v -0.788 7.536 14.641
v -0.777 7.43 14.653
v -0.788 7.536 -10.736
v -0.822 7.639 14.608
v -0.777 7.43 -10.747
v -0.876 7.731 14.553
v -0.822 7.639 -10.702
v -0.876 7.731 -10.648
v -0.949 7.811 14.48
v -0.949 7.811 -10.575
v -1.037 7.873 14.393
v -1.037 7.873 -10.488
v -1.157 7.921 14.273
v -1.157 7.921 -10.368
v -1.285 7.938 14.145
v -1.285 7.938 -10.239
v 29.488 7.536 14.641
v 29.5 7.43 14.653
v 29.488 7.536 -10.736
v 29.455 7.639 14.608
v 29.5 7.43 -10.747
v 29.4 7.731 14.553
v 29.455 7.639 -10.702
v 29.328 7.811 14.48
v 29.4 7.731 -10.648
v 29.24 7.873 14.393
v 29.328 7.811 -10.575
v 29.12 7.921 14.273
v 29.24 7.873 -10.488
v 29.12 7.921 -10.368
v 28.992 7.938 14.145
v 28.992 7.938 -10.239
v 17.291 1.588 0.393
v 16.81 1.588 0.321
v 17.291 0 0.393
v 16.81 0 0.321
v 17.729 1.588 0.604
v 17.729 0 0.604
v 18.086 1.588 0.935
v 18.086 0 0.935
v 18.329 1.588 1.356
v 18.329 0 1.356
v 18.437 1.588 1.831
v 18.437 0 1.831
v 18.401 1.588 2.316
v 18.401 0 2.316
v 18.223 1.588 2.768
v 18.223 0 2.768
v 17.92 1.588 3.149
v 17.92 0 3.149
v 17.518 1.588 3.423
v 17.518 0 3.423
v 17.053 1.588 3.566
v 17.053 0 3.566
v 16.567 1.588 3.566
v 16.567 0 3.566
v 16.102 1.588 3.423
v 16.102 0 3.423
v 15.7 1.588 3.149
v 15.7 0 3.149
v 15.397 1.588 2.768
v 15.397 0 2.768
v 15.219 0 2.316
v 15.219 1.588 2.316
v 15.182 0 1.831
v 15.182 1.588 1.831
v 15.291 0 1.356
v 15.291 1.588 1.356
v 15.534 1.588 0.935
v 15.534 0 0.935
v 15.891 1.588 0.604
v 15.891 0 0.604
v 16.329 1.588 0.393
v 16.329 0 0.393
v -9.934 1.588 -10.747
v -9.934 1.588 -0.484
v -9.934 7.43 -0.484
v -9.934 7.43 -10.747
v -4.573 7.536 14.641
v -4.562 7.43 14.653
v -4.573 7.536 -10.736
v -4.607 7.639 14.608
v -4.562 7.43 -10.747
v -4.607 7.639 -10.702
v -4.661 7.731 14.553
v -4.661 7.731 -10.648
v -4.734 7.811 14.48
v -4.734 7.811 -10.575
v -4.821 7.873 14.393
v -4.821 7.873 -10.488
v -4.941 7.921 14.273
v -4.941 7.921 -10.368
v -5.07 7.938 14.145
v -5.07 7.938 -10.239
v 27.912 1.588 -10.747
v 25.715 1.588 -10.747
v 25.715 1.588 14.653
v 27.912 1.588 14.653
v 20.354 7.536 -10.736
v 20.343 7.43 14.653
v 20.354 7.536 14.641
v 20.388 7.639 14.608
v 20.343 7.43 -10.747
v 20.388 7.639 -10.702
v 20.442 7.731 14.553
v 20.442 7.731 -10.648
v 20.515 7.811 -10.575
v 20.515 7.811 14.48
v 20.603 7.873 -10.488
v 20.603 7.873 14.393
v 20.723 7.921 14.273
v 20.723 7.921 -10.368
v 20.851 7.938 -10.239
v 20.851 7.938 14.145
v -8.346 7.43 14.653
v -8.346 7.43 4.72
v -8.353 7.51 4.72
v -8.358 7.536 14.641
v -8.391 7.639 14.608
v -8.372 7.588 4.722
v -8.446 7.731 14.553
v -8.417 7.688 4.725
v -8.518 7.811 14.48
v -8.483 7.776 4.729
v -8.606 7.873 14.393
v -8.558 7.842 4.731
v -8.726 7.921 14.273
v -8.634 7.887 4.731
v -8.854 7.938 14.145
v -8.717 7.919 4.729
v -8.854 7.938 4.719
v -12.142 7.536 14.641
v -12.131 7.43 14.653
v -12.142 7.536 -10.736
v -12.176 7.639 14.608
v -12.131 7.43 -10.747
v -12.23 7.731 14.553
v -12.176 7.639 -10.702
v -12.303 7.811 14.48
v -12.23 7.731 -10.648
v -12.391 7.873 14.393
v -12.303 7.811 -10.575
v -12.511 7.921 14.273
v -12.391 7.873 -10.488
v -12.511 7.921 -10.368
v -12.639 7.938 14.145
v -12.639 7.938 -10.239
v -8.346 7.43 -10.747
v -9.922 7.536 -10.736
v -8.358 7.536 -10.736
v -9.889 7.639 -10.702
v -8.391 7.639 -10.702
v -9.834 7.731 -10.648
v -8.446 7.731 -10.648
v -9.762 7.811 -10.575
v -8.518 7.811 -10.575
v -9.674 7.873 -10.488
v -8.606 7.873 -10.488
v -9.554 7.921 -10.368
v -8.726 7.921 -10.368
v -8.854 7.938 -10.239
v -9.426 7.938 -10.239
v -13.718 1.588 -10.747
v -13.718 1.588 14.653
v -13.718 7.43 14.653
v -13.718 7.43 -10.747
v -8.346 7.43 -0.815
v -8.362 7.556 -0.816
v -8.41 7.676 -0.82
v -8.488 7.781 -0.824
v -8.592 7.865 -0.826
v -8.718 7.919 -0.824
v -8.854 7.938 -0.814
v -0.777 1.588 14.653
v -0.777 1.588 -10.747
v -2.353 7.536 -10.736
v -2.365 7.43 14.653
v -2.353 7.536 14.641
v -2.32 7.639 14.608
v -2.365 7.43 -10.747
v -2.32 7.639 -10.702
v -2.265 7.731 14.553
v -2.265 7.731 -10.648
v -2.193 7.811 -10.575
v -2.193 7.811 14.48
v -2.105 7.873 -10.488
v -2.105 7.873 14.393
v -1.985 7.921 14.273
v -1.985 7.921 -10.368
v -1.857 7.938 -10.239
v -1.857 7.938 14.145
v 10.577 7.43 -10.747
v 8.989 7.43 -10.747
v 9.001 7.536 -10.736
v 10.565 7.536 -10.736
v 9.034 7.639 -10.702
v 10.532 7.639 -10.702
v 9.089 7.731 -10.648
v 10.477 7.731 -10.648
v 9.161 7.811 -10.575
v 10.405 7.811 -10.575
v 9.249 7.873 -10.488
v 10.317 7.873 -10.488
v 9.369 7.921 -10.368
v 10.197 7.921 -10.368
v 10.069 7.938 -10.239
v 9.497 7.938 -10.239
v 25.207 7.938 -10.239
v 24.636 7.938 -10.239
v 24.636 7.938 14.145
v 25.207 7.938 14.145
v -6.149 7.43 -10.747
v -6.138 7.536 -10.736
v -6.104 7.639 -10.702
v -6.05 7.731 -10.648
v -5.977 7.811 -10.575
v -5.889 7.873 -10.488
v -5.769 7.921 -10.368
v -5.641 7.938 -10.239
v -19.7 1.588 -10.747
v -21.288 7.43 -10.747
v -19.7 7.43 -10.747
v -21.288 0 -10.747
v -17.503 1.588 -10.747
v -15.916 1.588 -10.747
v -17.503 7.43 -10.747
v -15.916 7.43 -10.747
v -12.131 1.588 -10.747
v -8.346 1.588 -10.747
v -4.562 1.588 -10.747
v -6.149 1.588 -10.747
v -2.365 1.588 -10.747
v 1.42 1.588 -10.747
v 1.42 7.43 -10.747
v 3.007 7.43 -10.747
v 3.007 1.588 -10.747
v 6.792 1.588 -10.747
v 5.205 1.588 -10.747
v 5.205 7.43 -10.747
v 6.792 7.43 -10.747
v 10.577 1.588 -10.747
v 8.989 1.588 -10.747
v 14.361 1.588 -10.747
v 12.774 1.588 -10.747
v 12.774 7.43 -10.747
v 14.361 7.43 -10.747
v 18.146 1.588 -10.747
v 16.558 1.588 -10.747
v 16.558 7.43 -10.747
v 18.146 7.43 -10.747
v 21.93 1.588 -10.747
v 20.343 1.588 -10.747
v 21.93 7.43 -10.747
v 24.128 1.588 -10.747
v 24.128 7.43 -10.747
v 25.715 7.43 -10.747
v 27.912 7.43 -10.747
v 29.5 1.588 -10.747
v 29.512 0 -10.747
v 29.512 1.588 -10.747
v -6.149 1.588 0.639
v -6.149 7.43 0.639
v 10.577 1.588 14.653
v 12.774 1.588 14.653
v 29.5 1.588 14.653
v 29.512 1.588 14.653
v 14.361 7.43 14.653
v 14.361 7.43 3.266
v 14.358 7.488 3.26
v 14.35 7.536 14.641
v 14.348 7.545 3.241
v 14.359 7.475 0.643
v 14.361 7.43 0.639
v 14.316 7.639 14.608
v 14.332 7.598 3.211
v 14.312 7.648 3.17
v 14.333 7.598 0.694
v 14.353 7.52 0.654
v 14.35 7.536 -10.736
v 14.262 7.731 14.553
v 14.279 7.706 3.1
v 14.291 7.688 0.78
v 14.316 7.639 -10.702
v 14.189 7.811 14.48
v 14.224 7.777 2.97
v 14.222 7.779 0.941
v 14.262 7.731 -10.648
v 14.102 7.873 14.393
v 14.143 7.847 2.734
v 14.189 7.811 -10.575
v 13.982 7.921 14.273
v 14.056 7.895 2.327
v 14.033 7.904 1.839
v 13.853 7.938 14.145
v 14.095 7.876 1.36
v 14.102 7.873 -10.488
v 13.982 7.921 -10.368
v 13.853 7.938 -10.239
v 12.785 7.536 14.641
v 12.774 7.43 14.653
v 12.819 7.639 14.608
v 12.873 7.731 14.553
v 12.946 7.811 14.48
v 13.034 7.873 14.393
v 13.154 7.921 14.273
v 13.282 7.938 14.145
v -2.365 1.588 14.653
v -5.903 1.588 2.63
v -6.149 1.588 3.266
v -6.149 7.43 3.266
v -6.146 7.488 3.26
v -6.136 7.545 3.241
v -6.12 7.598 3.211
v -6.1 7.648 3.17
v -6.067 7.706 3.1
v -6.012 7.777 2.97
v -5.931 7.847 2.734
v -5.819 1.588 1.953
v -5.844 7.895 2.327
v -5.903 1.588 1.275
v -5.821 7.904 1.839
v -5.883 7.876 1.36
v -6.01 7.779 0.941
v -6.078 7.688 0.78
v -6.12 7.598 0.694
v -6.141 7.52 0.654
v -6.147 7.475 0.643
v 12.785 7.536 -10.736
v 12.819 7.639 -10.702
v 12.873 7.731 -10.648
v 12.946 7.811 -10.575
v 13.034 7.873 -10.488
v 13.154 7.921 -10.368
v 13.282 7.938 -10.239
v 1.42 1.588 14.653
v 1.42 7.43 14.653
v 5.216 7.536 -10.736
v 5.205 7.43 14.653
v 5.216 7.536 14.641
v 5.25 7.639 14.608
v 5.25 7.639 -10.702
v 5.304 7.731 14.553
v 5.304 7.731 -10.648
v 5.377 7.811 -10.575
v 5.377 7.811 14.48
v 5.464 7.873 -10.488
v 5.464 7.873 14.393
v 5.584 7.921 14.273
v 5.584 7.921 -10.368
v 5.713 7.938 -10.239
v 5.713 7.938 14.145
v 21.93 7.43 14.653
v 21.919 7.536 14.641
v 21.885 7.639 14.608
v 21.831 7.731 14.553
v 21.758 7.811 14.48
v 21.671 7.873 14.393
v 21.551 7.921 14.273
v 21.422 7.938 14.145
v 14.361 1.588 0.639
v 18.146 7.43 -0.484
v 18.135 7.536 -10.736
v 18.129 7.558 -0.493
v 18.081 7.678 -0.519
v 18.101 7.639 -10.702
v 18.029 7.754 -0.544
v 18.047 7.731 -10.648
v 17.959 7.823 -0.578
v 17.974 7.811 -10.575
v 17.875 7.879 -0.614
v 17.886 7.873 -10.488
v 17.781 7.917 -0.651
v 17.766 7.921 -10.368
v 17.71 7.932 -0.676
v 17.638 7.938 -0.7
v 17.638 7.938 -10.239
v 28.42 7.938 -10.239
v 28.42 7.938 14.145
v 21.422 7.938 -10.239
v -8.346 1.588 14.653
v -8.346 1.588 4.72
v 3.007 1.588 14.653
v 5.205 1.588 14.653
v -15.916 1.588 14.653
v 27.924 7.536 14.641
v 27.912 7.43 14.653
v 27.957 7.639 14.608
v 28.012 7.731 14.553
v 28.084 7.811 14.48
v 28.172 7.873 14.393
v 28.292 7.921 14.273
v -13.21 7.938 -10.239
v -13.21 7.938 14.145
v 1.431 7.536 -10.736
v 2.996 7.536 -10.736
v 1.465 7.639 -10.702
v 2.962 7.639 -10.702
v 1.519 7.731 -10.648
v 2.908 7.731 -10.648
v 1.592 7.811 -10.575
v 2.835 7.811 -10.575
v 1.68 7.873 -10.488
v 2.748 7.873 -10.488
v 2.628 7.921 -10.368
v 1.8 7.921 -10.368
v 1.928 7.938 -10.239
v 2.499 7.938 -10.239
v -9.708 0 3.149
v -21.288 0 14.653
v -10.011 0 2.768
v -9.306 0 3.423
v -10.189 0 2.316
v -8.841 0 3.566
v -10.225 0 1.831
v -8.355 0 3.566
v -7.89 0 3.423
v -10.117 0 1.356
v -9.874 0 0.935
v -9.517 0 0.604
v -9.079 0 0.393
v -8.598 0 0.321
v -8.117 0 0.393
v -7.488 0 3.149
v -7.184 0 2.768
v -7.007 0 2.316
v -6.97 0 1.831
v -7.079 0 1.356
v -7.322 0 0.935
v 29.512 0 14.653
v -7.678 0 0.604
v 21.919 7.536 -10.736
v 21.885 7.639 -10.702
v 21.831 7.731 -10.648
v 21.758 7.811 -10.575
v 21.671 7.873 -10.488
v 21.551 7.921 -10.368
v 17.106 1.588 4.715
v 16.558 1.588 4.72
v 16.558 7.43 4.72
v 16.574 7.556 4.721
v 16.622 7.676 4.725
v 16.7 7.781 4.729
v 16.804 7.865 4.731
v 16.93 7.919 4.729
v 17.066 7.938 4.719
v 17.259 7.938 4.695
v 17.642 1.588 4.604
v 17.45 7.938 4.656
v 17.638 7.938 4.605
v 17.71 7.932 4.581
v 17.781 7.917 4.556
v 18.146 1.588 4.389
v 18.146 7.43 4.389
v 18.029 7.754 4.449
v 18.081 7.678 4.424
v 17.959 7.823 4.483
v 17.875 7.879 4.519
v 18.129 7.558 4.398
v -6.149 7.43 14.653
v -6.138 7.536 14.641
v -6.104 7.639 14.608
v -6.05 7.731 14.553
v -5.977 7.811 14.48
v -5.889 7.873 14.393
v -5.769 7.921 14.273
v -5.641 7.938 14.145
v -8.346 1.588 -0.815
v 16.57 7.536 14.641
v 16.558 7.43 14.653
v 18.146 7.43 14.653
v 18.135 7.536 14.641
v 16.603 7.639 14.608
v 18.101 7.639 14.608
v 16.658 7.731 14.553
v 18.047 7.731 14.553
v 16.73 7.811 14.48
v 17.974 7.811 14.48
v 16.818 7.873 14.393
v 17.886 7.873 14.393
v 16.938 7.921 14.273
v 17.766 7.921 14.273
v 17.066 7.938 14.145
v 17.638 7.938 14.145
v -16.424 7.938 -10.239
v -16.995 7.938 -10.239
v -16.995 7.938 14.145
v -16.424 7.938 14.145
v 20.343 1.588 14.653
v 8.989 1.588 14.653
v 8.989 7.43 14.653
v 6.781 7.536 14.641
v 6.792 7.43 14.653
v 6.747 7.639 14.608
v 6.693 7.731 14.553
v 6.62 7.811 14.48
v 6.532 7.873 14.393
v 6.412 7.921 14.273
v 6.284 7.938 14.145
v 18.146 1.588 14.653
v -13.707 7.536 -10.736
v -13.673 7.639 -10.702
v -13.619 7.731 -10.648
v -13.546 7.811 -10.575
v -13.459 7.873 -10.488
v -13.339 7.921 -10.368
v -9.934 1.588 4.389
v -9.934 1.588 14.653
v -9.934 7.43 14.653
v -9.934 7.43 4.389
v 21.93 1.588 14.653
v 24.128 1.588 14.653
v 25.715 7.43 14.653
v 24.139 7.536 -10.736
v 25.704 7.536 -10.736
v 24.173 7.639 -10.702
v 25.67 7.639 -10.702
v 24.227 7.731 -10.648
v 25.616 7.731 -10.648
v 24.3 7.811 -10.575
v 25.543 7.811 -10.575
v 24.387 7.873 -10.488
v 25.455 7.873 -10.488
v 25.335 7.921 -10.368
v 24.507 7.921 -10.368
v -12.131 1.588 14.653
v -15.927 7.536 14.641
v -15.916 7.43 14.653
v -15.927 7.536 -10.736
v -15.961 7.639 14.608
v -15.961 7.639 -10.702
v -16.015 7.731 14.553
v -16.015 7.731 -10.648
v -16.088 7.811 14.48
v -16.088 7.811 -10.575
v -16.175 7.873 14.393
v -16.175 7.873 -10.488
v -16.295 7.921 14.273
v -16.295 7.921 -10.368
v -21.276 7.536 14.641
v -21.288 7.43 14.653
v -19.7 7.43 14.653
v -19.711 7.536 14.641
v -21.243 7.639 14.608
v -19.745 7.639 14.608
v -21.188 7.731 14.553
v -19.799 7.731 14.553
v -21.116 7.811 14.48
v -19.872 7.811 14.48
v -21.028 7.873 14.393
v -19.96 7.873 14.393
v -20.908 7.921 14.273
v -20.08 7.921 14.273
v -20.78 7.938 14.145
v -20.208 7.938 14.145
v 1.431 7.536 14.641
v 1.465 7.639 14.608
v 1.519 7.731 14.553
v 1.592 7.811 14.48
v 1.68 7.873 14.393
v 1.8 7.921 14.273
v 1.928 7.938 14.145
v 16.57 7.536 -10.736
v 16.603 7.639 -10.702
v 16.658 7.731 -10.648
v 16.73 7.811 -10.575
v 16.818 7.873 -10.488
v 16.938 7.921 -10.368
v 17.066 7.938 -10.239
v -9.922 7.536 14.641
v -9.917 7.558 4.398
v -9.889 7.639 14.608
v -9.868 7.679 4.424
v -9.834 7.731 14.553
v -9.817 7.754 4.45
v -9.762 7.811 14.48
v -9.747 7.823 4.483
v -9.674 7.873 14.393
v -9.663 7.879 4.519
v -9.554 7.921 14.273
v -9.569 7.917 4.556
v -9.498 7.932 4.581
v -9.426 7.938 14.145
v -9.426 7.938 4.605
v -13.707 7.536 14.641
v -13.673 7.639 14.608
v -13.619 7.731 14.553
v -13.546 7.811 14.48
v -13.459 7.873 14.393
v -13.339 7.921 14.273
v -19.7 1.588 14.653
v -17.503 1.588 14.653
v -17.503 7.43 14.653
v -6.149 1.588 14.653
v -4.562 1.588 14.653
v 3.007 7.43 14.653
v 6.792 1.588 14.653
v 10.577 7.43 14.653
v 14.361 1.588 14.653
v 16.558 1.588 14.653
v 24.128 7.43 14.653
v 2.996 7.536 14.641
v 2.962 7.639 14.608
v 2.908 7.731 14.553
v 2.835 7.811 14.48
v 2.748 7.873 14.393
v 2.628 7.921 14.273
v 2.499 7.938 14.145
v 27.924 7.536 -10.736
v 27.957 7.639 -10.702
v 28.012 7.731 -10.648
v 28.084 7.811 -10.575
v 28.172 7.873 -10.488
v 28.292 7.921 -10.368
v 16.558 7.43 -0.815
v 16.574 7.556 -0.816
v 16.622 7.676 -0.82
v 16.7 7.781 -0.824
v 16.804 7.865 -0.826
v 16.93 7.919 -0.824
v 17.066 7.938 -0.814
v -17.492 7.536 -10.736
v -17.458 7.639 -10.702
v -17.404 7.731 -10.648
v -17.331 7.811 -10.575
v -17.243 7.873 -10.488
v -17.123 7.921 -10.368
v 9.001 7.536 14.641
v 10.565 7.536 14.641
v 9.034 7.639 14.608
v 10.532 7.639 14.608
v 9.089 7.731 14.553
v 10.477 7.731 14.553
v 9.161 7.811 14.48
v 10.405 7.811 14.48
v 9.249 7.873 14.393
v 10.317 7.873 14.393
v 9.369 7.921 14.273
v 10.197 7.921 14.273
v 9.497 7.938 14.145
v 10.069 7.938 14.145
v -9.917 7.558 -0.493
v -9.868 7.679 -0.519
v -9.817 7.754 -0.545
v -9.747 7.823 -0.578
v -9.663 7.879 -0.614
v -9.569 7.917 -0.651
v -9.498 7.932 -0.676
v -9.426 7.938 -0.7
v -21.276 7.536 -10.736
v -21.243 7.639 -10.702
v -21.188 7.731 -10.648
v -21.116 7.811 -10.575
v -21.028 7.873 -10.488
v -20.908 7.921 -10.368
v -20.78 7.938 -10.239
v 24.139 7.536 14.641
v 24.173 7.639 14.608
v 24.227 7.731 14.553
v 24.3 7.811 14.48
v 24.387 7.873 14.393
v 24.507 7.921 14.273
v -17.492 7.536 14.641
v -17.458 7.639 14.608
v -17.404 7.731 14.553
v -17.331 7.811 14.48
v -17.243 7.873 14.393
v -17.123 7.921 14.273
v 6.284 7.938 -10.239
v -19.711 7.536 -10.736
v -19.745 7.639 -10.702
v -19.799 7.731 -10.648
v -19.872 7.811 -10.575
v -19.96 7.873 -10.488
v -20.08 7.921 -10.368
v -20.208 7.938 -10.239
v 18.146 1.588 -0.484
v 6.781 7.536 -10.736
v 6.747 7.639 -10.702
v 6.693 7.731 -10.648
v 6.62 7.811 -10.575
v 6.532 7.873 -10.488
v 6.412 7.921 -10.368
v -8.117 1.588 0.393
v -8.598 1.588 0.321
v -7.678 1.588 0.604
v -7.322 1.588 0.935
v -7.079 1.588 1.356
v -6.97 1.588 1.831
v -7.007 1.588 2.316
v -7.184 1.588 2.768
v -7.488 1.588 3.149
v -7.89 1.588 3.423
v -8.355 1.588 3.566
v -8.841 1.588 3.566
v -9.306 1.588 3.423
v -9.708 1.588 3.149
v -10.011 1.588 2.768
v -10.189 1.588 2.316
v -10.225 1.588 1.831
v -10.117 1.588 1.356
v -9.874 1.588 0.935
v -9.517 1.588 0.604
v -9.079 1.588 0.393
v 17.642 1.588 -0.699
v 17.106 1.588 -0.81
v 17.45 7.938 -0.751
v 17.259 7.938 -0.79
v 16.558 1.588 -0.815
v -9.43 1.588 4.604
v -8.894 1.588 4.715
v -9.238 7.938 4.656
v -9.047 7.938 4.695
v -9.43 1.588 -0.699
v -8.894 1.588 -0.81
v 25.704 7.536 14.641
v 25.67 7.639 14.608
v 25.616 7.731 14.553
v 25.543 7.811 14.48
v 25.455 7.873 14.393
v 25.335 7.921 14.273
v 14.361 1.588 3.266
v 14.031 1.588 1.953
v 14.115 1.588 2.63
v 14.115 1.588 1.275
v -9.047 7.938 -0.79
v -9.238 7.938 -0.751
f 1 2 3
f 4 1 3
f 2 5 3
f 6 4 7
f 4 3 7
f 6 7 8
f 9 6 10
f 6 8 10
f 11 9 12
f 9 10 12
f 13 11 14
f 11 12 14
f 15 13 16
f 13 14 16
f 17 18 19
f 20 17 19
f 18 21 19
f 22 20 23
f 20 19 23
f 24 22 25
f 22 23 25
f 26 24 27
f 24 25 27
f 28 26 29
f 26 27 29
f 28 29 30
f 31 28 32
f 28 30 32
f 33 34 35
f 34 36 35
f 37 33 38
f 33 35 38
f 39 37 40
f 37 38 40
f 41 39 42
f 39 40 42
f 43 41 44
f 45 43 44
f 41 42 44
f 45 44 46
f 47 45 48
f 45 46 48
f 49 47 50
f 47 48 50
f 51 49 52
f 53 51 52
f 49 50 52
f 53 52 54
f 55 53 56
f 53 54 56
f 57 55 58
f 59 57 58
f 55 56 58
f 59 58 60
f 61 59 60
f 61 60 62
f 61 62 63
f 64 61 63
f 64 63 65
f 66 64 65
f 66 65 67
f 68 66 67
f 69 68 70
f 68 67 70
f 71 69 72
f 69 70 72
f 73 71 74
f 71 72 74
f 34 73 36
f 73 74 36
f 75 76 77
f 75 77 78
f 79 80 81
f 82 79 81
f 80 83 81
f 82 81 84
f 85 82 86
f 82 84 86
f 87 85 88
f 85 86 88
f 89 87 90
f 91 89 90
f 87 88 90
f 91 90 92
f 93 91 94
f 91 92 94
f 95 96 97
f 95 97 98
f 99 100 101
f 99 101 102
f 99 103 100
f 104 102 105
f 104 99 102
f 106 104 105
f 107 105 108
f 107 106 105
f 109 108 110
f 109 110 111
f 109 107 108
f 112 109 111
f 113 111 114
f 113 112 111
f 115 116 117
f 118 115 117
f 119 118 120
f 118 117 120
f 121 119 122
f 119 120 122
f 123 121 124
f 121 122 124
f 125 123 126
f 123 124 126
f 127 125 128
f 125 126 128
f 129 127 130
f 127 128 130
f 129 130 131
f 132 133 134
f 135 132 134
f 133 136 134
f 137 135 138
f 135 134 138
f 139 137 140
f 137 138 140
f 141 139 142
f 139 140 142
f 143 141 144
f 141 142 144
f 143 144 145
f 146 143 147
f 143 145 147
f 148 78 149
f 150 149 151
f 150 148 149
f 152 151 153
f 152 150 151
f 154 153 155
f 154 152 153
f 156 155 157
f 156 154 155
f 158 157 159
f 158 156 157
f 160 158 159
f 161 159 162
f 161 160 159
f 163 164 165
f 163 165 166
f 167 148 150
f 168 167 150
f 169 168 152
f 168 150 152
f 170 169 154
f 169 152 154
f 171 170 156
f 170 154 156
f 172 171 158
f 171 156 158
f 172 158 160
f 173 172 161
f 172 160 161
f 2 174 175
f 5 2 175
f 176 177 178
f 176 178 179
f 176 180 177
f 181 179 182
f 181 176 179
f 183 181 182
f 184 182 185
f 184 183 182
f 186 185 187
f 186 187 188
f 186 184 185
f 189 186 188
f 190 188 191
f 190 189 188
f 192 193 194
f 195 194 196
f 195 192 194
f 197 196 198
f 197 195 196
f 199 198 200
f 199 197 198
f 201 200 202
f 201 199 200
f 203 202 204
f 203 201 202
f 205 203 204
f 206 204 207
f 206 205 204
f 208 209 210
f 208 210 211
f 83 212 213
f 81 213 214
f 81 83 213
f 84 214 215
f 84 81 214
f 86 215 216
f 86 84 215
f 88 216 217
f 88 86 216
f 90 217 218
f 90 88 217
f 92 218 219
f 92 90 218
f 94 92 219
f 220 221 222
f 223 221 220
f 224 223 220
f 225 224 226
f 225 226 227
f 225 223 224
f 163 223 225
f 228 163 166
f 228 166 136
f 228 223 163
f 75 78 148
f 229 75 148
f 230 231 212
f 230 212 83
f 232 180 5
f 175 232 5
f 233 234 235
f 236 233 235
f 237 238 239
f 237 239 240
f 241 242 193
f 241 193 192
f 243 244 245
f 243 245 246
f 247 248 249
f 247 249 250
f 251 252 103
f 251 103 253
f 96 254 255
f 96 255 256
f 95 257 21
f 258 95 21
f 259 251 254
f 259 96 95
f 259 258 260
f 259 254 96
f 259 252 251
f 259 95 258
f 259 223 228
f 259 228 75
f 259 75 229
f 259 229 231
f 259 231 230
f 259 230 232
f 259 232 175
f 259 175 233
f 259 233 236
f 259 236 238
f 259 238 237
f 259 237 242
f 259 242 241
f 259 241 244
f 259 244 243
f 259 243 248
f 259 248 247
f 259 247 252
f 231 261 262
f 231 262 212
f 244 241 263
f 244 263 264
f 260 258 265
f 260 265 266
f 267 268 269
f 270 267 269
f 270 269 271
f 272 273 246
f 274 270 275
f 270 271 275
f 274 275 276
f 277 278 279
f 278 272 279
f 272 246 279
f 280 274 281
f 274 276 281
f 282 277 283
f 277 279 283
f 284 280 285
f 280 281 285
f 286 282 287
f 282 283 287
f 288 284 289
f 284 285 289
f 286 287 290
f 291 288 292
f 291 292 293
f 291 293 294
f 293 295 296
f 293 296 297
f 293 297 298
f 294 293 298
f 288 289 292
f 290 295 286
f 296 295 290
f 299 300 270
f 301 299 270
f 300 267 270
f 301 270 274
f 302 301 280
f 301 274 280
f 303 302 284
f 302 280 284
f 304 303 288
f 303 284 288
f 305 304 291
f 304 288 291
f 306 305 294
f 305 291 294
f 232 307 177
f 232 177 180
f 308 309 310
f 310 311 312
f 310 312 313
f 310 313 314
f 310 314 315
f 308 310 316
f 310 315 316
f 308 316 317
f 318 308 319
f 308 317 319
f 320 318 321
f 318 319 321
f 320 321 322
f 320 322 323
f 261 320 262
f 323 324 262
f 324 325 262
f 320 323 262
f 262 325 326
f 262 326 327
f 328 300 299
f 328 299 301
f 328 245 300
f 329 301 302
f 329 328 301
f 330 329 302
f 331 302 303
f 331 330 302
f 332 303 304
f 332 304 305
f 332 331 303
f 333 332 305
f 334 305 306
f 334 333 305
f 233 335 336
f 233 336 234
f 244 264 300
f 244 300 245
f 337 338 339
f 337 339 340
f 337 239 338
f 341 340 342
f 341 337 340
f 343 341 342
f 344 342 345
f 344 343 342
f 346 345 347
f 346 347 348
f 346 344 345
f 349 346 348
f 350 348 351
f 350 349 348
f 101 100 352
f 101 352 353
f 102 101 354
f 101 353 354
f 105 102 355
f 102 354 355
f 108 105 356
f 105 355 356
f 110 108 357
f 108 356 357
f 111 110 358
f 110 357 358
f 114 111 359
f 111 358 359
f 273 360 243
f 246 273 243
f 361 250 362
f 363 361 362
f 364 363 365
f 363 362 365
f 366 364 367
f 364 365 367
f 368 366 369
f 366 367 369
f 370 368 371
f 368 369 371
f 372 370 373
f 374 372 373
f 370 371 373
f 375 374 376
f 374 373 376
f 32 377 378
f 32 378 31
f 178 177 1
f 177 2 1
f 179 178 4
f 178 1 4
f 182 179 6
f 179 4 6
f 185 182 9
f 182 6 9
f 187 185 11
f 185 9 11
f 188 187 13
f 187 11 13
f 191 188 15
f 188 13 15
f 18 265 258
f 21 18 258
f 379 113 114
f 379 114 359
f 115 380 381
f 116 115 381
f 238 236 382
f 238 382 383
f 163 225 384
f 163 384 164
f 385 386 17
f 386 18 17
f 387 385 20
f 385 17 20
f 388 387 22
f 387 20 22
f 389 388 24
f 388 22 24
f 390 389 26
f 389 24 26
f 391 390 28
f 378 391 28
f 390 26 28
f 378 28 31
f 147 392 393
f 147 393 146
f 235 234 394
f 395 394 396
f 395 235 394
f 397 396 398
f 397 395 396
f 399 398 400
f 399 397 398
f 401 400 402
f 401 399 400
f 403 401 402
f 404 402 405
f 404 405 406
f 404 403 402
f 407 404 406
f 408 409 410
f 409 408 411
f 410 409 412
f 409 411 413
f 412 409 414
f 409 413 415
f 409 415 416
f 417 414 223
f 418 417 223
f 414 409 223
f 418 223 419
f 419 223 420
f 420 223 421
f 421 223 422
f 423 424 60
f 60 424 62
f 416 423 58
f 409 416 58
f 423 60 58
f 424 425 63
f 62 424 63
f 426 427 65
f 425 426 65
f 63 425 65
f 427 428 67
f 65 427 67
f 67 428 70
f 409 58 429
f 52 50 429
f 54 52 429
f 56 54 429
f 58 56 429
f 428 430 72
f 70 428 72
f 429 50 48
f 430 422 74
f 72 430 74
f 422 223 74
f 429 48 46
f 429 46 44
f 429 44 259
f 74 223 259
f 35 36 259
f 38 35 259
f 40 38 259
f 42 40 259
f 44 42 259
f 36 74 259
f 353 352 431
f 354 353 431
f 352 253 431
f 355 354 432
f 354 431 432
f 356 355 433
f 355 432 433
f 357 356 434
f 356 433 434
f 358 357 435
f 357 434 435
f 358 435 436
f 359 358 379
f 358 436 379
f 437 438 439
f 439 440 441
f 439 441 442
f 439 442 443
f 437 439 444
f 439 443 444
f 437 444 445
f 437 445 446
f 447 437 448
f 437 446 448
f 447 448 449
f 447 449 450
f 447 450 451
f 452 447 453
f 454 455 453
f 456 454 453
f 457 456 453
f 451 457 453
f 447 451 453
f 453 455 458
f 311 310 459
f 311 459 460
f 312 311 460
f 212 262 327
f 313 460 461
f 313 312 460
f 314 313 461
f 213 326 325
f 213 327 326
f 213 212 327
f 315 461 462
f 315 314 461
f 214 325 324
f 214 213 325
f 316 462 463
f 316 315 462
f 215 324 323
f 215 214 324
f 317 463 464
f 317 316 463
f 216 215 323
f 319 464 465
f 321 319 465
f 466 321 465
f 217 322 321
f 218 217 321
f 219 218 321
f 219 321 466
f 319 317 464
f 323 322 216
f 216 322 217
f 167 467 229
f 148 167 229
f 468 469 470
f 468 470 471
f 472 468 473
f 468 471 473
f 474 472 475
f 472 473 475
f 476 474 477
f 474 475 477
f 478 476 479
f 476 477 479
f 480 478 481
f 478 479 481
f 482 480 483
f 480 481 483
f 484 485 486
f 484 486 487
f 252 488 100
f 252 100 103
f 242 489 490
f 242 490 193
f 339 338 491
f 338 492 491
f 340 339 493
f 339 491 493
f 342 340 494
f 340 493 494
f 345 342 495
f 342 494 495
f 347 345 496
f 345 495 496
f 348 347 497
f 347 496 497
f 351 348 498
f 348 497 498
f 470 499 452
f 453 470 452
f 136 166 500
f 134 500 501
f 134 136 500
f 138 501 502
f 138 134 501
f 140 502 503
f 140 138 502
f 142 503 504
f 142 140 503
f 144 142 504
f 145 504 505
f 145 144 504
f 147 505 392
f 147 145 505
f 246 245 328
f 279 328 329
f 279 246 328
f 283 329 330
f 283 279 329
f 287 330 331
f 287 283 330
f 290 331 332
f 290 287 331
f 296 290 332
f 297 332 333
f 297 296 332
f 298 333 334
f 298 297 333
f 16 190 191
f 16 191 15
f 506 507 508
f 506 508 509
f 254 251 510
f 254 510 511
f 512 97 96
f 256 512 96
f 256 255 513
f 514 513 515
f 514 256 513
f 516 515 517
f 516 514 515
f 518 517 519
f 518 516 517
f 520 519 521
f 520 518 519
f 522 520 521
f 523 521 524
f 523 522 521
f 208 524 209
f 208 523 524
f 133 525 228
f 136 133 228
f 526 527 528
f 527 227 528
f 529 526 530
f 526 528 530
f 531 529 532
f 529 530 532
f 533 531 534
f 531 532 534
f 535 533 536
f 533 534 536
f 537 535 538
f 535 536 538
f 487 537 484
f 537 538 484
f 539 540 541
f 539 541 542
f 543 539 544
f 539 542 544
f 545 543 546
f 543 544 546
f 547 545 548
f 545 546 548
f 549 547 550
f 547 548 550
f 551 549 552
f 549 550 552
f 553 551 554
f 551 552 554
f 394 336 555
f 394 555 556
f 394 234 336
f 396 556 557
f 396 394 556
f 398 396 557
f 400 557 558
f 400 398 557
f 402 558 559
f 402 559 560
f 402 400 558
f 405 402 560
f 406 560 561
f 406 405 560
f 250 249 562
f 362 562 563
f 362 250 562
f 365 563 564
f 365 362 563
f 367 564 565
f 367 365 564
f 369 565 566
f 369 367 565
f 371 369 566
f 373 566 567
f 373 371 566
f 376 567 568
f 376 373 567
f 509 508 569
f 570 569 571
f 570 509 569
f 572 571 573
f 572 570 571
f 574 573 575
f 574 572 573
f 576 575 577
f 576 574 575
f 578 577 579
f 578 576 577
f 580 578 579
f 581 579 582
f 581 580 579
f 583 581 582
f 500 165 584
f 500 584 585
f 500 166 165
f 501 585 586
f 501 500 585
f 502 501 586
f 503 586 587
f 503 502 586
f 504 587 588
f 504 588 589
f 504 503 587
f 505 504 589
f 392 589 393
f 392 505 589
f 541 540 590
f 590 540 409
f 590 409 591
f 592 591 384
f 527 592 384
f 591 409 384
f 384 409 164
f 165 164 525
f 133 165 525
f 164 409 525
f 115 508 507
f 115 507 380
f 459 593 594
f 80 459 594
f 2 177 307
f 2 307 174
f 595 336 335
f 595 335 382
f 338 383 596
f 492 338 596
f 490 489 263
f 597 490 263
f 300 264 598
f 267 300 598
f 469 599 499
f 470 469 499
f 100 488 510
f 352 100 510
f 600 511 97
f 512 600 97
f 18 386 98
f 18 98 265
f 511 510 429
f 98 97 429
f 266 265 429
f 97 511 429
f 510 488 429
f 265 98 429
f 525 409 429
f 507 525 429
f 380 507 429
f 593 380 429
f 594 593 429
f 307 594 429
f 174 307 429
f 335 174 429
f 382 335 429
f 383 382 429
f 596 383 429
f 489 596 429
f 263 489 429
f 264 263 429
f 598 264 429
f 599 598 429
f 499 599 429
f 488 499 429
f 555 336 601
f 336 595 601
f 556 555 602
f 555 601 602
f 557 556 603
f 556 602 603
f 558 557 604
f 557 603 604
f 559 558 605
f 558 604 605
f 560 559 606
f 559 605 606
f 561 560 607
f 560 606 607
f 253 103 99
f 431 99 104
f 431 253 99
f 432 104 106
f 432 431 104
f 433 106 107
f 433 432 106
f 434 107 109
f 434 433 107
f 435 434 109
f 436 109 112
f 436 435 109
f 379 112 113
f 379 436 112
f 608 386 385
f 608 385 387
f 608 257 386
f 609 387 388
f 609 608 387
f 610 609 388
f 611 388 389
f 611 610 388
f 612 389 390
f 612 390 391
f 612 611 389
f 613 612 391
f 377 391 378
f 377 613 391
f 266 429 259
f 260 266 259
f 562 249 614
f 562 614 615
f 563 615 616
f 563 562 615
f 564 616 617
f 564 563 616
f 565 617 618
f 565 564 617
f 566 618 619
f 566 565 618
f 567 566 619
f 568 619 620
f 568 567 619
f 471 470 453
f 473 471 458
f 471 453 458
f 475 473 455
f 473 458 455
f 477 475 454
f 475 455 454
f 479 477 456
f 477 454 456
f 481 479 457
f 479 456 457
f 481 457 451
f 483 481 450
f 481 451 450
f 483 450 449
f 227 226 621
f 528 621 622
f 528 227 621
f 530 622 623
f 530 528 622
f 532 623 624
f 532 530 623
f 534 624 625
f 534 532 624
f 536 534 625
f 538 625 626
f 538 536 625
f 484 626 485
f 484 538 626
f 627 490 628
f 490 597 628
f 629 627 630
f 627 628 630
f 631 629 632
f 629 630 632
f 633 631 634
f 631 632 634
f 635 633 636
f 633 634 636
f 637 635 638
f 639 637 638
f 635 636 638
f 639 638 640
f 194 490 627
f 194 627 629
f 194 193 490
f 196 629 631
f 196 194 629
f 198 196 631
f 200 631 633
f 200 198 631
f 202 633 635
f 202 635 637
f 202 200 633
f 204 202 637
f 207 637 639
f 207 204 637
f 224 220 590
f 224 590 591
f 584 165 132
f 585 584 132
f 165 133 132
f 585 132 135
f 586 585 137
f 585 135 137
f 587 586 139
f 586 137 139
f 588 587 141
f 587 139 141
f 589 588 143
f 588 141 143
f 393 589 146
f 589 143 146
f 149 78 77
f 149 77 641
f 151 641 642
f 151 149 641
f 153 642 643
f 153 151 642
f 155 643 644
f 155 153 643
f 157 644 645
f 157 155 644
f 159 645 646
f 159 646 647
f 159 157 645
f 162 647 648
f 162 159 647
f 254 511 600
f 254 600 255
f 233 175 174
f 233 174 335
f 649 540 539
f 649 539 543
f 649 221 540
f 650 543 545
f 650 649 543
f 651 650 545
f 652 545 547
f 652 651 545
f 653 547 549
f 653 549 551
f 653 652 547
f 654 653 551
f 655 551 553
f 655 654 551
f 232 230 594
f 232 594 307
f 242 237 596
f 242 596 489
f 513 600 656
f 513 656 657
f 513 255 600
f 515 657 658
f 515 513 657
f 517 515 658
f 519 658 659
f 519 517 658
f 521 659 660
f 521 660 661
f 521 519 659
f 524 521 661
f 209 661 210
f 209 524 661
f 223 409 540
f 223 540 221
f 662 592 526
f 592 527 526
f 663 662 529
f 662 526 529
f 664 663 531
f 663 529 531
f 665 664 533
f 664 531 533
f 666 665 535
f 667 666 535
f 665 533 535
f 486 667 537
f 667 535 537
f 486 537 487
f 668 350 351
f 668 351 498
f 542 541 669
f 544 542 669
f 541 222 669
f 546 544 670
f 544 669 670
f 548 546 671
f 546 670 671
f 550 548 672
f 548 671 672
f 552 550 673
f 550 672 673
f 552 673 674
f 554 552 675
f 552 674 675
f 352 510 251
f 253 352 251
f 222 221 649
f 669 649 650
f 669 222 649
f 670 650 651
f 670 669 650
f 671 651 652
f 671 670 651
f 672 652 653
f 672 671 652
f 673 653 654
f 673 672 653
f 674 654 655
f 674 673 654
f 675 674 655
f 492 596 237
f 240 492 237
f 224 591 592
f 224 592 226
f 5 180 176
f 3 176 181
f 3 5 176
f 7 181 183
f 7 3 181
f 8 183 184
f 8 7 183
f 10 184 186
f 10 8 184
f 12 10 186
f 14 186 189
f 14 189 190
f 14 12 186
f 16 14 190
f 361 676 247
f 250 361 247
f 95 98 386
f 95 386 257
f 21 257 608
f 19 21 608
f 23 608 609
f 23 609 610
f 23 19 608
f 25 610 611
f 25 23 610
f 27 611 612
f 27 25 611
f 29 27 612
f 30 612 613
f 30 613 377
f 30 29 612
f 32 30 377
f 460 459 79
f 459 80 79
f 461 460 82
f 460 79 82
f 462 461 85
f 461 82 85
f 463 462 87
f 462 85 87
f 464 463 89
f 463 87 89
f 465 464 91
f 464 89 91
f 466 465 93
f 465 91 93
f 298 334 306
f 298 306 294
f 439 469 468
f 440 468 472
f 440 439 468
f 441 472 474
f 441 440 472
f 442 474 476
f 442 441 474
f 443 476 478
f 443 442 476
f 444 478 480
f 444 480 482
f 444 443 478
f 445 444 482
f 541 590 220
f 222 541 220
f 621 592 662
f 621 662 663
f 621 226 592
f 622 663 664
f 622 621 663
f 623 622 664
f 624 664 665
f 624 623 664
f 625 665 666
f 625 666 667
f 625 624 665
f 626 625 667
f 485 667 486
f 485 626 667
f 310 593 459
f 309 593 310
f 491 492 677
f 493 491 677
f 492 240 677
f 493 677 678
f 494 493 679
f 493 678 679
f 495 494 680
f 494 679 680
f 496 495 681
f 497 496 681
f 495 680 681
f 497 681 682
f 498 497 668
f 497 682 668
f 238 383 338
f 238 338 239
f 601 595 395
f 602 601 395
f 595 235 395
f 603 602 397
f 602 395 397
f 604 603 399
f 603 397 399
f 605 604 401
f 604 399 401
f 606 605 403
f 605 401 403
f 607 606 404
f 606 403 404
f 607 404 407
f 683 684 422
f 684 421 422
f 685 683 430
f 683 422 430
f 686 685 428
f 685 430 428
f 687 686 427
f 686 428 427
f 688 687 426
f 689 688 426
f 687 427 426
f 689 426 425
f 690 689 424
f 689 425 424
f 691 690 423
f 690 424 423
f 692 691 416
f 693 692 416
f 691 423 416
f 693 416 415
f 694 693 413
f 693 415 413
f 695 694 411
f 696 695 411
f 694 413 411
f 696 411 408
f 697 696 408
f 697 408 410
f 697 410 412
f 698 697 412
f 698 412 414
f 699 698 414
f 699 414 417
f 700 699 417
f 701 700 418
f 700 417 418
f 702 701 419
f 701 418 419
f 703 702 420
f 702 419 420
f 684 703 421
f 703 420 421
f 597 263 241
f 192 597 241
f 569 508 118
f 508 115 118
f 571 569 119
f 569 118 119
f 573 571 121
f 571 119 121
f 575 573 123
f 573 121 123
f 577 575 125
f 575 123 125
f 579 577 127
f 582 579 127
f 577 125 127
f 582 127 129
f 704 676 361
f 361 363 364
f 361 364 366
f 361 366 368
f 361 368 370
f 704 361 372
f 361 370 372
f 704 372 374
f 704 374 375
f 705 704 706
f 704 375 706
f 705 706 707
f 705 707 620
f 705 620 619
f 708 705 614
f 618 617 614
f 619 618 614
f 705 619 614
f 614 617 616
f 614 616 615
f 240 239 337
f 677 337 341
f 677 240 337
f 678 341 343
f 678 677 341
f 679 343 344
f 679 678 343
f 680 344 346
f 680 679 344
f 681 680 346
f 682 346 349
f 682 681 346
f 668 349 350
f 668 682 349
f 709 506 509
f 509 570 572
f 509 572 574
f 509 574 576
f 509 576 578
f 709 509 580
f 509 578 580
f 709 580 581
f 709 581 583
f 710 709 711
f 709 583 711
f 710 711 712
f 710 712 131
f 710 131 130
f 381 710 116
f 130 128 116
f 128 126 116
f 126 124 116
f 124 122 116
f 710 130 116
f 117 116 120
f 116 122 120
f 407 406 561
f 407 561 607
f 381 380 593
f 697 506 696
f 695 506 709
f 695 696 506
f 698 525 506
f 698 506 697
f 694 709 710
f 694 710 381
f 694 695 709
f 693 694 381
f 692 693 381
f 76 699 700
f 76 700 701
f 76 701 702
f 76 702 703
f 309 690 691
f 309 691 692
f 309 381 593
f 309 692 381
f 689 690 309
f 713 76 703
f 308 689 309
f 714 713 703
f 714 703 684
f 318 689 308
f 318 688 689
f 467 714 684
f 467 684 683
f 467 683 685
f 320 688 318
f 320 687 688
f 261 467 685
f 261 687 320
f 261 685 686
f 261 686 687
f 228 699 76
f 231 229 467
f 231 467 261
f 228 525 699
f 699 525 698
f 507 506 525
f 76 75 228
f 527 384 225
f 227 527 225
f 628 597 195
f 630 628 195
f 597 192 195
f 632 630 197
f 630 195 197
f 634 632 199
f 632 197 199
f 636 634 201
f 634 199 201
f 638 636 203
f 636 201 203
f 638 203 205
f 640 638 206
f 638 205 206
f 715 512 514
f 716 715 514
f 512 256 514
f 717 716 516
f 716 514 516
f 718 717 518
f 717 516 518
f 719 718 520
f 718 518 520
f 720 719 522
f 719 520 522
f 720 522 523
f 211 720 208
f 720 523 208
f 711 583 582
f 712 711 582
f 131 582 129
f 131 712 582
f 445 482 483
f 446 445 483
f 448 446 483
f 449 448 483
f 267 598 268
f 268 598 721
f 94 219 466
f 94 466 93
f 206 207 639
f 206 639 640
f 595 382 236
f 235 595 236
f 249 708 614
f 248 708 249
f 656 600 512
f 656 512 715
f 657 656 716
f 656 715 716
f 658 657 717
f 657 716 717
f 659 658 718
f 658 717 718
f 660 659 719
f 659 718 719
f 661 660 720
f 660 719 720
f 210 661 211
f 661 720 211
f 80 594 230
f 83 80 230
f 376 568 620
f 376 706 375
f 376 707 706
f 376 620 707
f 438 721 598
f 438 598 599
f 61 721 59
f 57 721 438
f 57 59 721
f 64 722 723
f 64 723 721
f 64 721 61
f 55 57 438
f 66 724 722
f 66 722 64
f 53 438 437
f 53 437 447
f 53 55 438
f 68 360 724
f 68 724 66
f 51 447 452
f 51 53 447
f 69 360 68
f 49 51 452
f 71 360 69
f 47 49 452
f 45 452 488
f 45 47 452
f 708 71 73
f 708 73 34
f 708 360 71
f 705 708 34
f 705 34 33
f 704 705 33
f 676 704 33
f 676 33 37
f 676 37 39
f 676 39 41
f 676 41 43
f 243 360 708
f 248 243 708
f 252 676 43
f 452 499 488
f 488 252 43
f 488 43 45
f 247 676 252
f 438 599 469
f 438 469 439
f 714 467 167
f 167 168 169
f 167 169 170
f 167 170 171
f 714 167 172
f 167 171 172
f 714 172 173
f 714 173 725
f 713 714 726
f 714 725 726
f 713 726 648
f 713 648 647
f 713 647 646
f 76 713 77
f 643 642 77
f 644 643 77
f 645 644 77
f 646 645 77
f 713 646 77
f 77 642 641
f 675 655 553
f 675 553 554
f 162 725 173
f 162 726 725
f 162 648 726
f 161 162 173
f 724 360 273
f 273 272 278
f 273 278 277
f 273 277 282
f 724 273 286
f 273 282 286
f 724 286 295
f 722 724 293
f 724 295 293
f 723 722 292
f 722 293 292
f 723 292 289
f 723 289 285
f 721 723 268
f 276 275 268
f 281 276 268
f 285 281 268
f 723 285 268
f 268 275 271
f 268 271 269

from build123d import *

# Parameters (mm, degrees)
SKETCH2_W                                      = 50.8
SKETCH2_H                                      = 25.4
BOSS_EXTRUDE1_DEPTH                            = 1.5875
SKETCH3_W                                      = 1.5875
SKETCH3_H                                      = 25.4
BOSS_EXTRUDE2_DEPTH                            = 6.35
FILLET1_R                                      = 0.508
LPATTERN1_COUNT                                = 14
LPATTERN1_PITCH                                = 3.7846
FILLET1_OF_LPATTERN1_R                         = 0.508
CBORE_FOR_4_SOCKET_HEAD_CAP_SCREW1_D           = 3.2639
CBORE_FOR_4_SOCKET_HEAD_CAP_SCREW1_CBORE_D     = 5.55752
CBORE_FOR_4_SOCKET_HEAD_CAP_SCREW1_CBORE_DEPTH = 6.35


with BuildPart() as part:
    # Sketch2 → Boss-Extrude1 (new body)
    with BuildSketch(Plane(origin=(0, 0, 0), x_dir=(1, 0, 0), z_dir=(0, 1, 0))):
        with Locations((4.112380952, -1.952517007)):
            Rectangle(SKETCH2_W, SKETCH2_H)
    extrude(amount=BOSS_EXTRUDE1_DEPTH)

    # Sketch3 → Boss-Extrude2 (add)
    with BuildSketch(Plane(origin=(0, 1.5875, 0), x_dir=(1, 0, 0), z_dir=(0, 1, 0))):
        with Locations((-20.493869048, -1.952517007)):
            Rectangle(SKETCH3_W, SKETCH3_H)
    boss_extrude2 = extrude(amount=BOSS_EXTRUDE2_DEPTH)

    # Fillet1
    fillet1_edges = [part.edges().sort_by_distance(p)[0] for p in [
        (-20.493869048, 7.9375, -10.747482993),
        (-21.287619048, 7.9375, 1.952517007),
        (-20.493869048, 7.9375, 14.652517007),
        (-19.700119048, 7.9375, 1.952517007),
    ]]
    fillet(fillet1_edges, radius=FILLET1_R)

    # LPattern1: Boss-Extrude2 ×14
    with Locations(*[(i * LPATTERN1_PITCH, 0, 0) for i in range(1, LPATTERN1_COUNT)]):
        add(boss_extrude2)

    # Fillet1 of LPattern1
    fillet1_of_lpattern1_edges = [part.edges().sort_by_distance(p)[0] for p in [
        (-16.709269048, 7.9375, -10.747482993),
        (-17.503019048, 7.9375, 1.952517007),
        (-16.709269048, 7.9375, 14.652517007),
        (-15.915519048, 7.9375, 1.952517007),
        (-12.924669048, 7.9375, -10.747482993),
        (-13.718419048, 7.9375, 1.952517007),
        (-12.924669048, 7.9375, 14.652517007),
        (-12.130919048, 7.9375, 1.952517007),
        (-9.140069048, 7.9375, -10.747482993),
        (-9.933819048, 7.9375, 1.952517007),
        (-9.140069048, 7.9375, 14.652517007),
        (-8.346319048, 7.9375, 1.952517007),
        (-5.355469048, 7.9375, -10.747482993),
        (-6.149219048, 7.9375, 1.952517007),
        (-5.355469048, 7.9375, 14.652517007),
        (-4.561719048, 7.9375, 1.952517007),
        (-1.570869048, 7.9375, -10.747482993),
        (-2.364619048, 7.9375, 1.952517007),
        (-1.570869048, 7.9375, 14.652517007),
        (-0.777119048, 7.9375, 1.952517007),
        (2.213730952, 7.9375, -10.747482993),
        (1.419980952, 7.9375, 1.952517007),
        (2.213730952, 7.9375, 14.652517007),
        (3.007480952, 7.9375, 1.952517007),
        (5.998330952, 7.9375, -10.747482993),
        (5.204580952, 7.9375, 1.952517007),
        (5.998330952, 7.9375, 14.652517007),
        (6.792080952, 7.9375, 1.952517007),
        (9.782930952, 7.9375, -10.747482993),
        (8.989180952, 7.9375, 1.952517007),
        (9.782930952, 7.9375, 14.652517007),
        (10.576680952, 7.9375, 1.952517007),
        (13.567530952, 7.9375, -10.747482993),
        (12.773780952, 7.9375, 1.952517007),
        (13.567530952, 7.9375, 14.652517007),
        (14.361280952, 7.9375, 1.952517007),
        (17.352130952, 7.9375, -10.747482993),
        (16.558380952, 7.9375, 1.952517007),
        (17.352130952, 7.9375, 14.652517007),
        (18.145880952, 7.9375, 1.952517007),
        (21.136730952, 7.9375, -10.747482993),
        (20.342980952, 7.9375, 1.952517007),
        (21.136730952, 7.9375, 14.652517007),
        (21.930480952, 7.9375, 1.952517007),
        (24.921330952, 7.9375, -10.747482993),
        (24.127580952, 7.9375, 1.952517007),
        (24.921330952, 7.9375, 14.652517007),
        (25.715080952, 7.9375, 1.952517007),
        (28.705930952, 7.9375, -10.747482993),
        (27.912180952, 7.9375, 1.952517007),
        (28.705930952, 7.9375, 14.652517007),
        (29.499680952, 7.9375, 1.952517007),
    ]]
    fillet(fillet1_of_lpattern1_edges, radius=FILLET1_OF_LPATTERN1_R)

    # CBORE for #4 Socket Head Cap Screw1 (through all)
    with Locations(Plane(origin=(-8.597783115, 7.9375, 1.952517007), x_dir=(0, 0, 1), z_dir=(0, 1, 0))):
        with Locations((0, 0), (0, 25.407628135)):
            CounterBoreHole(CBORE_FOR_4_SOCKET_HEAD_CAP_SCREW1_D / 2, CBORE_FOR_4_SOCKET_HEAD_CAP_SCREW1_CBORE_D / 2, CBORE_FOR_4_SOCKET_HEAD_CAP_SCREW1_CBORE_DEPTH)


solid = part.part
